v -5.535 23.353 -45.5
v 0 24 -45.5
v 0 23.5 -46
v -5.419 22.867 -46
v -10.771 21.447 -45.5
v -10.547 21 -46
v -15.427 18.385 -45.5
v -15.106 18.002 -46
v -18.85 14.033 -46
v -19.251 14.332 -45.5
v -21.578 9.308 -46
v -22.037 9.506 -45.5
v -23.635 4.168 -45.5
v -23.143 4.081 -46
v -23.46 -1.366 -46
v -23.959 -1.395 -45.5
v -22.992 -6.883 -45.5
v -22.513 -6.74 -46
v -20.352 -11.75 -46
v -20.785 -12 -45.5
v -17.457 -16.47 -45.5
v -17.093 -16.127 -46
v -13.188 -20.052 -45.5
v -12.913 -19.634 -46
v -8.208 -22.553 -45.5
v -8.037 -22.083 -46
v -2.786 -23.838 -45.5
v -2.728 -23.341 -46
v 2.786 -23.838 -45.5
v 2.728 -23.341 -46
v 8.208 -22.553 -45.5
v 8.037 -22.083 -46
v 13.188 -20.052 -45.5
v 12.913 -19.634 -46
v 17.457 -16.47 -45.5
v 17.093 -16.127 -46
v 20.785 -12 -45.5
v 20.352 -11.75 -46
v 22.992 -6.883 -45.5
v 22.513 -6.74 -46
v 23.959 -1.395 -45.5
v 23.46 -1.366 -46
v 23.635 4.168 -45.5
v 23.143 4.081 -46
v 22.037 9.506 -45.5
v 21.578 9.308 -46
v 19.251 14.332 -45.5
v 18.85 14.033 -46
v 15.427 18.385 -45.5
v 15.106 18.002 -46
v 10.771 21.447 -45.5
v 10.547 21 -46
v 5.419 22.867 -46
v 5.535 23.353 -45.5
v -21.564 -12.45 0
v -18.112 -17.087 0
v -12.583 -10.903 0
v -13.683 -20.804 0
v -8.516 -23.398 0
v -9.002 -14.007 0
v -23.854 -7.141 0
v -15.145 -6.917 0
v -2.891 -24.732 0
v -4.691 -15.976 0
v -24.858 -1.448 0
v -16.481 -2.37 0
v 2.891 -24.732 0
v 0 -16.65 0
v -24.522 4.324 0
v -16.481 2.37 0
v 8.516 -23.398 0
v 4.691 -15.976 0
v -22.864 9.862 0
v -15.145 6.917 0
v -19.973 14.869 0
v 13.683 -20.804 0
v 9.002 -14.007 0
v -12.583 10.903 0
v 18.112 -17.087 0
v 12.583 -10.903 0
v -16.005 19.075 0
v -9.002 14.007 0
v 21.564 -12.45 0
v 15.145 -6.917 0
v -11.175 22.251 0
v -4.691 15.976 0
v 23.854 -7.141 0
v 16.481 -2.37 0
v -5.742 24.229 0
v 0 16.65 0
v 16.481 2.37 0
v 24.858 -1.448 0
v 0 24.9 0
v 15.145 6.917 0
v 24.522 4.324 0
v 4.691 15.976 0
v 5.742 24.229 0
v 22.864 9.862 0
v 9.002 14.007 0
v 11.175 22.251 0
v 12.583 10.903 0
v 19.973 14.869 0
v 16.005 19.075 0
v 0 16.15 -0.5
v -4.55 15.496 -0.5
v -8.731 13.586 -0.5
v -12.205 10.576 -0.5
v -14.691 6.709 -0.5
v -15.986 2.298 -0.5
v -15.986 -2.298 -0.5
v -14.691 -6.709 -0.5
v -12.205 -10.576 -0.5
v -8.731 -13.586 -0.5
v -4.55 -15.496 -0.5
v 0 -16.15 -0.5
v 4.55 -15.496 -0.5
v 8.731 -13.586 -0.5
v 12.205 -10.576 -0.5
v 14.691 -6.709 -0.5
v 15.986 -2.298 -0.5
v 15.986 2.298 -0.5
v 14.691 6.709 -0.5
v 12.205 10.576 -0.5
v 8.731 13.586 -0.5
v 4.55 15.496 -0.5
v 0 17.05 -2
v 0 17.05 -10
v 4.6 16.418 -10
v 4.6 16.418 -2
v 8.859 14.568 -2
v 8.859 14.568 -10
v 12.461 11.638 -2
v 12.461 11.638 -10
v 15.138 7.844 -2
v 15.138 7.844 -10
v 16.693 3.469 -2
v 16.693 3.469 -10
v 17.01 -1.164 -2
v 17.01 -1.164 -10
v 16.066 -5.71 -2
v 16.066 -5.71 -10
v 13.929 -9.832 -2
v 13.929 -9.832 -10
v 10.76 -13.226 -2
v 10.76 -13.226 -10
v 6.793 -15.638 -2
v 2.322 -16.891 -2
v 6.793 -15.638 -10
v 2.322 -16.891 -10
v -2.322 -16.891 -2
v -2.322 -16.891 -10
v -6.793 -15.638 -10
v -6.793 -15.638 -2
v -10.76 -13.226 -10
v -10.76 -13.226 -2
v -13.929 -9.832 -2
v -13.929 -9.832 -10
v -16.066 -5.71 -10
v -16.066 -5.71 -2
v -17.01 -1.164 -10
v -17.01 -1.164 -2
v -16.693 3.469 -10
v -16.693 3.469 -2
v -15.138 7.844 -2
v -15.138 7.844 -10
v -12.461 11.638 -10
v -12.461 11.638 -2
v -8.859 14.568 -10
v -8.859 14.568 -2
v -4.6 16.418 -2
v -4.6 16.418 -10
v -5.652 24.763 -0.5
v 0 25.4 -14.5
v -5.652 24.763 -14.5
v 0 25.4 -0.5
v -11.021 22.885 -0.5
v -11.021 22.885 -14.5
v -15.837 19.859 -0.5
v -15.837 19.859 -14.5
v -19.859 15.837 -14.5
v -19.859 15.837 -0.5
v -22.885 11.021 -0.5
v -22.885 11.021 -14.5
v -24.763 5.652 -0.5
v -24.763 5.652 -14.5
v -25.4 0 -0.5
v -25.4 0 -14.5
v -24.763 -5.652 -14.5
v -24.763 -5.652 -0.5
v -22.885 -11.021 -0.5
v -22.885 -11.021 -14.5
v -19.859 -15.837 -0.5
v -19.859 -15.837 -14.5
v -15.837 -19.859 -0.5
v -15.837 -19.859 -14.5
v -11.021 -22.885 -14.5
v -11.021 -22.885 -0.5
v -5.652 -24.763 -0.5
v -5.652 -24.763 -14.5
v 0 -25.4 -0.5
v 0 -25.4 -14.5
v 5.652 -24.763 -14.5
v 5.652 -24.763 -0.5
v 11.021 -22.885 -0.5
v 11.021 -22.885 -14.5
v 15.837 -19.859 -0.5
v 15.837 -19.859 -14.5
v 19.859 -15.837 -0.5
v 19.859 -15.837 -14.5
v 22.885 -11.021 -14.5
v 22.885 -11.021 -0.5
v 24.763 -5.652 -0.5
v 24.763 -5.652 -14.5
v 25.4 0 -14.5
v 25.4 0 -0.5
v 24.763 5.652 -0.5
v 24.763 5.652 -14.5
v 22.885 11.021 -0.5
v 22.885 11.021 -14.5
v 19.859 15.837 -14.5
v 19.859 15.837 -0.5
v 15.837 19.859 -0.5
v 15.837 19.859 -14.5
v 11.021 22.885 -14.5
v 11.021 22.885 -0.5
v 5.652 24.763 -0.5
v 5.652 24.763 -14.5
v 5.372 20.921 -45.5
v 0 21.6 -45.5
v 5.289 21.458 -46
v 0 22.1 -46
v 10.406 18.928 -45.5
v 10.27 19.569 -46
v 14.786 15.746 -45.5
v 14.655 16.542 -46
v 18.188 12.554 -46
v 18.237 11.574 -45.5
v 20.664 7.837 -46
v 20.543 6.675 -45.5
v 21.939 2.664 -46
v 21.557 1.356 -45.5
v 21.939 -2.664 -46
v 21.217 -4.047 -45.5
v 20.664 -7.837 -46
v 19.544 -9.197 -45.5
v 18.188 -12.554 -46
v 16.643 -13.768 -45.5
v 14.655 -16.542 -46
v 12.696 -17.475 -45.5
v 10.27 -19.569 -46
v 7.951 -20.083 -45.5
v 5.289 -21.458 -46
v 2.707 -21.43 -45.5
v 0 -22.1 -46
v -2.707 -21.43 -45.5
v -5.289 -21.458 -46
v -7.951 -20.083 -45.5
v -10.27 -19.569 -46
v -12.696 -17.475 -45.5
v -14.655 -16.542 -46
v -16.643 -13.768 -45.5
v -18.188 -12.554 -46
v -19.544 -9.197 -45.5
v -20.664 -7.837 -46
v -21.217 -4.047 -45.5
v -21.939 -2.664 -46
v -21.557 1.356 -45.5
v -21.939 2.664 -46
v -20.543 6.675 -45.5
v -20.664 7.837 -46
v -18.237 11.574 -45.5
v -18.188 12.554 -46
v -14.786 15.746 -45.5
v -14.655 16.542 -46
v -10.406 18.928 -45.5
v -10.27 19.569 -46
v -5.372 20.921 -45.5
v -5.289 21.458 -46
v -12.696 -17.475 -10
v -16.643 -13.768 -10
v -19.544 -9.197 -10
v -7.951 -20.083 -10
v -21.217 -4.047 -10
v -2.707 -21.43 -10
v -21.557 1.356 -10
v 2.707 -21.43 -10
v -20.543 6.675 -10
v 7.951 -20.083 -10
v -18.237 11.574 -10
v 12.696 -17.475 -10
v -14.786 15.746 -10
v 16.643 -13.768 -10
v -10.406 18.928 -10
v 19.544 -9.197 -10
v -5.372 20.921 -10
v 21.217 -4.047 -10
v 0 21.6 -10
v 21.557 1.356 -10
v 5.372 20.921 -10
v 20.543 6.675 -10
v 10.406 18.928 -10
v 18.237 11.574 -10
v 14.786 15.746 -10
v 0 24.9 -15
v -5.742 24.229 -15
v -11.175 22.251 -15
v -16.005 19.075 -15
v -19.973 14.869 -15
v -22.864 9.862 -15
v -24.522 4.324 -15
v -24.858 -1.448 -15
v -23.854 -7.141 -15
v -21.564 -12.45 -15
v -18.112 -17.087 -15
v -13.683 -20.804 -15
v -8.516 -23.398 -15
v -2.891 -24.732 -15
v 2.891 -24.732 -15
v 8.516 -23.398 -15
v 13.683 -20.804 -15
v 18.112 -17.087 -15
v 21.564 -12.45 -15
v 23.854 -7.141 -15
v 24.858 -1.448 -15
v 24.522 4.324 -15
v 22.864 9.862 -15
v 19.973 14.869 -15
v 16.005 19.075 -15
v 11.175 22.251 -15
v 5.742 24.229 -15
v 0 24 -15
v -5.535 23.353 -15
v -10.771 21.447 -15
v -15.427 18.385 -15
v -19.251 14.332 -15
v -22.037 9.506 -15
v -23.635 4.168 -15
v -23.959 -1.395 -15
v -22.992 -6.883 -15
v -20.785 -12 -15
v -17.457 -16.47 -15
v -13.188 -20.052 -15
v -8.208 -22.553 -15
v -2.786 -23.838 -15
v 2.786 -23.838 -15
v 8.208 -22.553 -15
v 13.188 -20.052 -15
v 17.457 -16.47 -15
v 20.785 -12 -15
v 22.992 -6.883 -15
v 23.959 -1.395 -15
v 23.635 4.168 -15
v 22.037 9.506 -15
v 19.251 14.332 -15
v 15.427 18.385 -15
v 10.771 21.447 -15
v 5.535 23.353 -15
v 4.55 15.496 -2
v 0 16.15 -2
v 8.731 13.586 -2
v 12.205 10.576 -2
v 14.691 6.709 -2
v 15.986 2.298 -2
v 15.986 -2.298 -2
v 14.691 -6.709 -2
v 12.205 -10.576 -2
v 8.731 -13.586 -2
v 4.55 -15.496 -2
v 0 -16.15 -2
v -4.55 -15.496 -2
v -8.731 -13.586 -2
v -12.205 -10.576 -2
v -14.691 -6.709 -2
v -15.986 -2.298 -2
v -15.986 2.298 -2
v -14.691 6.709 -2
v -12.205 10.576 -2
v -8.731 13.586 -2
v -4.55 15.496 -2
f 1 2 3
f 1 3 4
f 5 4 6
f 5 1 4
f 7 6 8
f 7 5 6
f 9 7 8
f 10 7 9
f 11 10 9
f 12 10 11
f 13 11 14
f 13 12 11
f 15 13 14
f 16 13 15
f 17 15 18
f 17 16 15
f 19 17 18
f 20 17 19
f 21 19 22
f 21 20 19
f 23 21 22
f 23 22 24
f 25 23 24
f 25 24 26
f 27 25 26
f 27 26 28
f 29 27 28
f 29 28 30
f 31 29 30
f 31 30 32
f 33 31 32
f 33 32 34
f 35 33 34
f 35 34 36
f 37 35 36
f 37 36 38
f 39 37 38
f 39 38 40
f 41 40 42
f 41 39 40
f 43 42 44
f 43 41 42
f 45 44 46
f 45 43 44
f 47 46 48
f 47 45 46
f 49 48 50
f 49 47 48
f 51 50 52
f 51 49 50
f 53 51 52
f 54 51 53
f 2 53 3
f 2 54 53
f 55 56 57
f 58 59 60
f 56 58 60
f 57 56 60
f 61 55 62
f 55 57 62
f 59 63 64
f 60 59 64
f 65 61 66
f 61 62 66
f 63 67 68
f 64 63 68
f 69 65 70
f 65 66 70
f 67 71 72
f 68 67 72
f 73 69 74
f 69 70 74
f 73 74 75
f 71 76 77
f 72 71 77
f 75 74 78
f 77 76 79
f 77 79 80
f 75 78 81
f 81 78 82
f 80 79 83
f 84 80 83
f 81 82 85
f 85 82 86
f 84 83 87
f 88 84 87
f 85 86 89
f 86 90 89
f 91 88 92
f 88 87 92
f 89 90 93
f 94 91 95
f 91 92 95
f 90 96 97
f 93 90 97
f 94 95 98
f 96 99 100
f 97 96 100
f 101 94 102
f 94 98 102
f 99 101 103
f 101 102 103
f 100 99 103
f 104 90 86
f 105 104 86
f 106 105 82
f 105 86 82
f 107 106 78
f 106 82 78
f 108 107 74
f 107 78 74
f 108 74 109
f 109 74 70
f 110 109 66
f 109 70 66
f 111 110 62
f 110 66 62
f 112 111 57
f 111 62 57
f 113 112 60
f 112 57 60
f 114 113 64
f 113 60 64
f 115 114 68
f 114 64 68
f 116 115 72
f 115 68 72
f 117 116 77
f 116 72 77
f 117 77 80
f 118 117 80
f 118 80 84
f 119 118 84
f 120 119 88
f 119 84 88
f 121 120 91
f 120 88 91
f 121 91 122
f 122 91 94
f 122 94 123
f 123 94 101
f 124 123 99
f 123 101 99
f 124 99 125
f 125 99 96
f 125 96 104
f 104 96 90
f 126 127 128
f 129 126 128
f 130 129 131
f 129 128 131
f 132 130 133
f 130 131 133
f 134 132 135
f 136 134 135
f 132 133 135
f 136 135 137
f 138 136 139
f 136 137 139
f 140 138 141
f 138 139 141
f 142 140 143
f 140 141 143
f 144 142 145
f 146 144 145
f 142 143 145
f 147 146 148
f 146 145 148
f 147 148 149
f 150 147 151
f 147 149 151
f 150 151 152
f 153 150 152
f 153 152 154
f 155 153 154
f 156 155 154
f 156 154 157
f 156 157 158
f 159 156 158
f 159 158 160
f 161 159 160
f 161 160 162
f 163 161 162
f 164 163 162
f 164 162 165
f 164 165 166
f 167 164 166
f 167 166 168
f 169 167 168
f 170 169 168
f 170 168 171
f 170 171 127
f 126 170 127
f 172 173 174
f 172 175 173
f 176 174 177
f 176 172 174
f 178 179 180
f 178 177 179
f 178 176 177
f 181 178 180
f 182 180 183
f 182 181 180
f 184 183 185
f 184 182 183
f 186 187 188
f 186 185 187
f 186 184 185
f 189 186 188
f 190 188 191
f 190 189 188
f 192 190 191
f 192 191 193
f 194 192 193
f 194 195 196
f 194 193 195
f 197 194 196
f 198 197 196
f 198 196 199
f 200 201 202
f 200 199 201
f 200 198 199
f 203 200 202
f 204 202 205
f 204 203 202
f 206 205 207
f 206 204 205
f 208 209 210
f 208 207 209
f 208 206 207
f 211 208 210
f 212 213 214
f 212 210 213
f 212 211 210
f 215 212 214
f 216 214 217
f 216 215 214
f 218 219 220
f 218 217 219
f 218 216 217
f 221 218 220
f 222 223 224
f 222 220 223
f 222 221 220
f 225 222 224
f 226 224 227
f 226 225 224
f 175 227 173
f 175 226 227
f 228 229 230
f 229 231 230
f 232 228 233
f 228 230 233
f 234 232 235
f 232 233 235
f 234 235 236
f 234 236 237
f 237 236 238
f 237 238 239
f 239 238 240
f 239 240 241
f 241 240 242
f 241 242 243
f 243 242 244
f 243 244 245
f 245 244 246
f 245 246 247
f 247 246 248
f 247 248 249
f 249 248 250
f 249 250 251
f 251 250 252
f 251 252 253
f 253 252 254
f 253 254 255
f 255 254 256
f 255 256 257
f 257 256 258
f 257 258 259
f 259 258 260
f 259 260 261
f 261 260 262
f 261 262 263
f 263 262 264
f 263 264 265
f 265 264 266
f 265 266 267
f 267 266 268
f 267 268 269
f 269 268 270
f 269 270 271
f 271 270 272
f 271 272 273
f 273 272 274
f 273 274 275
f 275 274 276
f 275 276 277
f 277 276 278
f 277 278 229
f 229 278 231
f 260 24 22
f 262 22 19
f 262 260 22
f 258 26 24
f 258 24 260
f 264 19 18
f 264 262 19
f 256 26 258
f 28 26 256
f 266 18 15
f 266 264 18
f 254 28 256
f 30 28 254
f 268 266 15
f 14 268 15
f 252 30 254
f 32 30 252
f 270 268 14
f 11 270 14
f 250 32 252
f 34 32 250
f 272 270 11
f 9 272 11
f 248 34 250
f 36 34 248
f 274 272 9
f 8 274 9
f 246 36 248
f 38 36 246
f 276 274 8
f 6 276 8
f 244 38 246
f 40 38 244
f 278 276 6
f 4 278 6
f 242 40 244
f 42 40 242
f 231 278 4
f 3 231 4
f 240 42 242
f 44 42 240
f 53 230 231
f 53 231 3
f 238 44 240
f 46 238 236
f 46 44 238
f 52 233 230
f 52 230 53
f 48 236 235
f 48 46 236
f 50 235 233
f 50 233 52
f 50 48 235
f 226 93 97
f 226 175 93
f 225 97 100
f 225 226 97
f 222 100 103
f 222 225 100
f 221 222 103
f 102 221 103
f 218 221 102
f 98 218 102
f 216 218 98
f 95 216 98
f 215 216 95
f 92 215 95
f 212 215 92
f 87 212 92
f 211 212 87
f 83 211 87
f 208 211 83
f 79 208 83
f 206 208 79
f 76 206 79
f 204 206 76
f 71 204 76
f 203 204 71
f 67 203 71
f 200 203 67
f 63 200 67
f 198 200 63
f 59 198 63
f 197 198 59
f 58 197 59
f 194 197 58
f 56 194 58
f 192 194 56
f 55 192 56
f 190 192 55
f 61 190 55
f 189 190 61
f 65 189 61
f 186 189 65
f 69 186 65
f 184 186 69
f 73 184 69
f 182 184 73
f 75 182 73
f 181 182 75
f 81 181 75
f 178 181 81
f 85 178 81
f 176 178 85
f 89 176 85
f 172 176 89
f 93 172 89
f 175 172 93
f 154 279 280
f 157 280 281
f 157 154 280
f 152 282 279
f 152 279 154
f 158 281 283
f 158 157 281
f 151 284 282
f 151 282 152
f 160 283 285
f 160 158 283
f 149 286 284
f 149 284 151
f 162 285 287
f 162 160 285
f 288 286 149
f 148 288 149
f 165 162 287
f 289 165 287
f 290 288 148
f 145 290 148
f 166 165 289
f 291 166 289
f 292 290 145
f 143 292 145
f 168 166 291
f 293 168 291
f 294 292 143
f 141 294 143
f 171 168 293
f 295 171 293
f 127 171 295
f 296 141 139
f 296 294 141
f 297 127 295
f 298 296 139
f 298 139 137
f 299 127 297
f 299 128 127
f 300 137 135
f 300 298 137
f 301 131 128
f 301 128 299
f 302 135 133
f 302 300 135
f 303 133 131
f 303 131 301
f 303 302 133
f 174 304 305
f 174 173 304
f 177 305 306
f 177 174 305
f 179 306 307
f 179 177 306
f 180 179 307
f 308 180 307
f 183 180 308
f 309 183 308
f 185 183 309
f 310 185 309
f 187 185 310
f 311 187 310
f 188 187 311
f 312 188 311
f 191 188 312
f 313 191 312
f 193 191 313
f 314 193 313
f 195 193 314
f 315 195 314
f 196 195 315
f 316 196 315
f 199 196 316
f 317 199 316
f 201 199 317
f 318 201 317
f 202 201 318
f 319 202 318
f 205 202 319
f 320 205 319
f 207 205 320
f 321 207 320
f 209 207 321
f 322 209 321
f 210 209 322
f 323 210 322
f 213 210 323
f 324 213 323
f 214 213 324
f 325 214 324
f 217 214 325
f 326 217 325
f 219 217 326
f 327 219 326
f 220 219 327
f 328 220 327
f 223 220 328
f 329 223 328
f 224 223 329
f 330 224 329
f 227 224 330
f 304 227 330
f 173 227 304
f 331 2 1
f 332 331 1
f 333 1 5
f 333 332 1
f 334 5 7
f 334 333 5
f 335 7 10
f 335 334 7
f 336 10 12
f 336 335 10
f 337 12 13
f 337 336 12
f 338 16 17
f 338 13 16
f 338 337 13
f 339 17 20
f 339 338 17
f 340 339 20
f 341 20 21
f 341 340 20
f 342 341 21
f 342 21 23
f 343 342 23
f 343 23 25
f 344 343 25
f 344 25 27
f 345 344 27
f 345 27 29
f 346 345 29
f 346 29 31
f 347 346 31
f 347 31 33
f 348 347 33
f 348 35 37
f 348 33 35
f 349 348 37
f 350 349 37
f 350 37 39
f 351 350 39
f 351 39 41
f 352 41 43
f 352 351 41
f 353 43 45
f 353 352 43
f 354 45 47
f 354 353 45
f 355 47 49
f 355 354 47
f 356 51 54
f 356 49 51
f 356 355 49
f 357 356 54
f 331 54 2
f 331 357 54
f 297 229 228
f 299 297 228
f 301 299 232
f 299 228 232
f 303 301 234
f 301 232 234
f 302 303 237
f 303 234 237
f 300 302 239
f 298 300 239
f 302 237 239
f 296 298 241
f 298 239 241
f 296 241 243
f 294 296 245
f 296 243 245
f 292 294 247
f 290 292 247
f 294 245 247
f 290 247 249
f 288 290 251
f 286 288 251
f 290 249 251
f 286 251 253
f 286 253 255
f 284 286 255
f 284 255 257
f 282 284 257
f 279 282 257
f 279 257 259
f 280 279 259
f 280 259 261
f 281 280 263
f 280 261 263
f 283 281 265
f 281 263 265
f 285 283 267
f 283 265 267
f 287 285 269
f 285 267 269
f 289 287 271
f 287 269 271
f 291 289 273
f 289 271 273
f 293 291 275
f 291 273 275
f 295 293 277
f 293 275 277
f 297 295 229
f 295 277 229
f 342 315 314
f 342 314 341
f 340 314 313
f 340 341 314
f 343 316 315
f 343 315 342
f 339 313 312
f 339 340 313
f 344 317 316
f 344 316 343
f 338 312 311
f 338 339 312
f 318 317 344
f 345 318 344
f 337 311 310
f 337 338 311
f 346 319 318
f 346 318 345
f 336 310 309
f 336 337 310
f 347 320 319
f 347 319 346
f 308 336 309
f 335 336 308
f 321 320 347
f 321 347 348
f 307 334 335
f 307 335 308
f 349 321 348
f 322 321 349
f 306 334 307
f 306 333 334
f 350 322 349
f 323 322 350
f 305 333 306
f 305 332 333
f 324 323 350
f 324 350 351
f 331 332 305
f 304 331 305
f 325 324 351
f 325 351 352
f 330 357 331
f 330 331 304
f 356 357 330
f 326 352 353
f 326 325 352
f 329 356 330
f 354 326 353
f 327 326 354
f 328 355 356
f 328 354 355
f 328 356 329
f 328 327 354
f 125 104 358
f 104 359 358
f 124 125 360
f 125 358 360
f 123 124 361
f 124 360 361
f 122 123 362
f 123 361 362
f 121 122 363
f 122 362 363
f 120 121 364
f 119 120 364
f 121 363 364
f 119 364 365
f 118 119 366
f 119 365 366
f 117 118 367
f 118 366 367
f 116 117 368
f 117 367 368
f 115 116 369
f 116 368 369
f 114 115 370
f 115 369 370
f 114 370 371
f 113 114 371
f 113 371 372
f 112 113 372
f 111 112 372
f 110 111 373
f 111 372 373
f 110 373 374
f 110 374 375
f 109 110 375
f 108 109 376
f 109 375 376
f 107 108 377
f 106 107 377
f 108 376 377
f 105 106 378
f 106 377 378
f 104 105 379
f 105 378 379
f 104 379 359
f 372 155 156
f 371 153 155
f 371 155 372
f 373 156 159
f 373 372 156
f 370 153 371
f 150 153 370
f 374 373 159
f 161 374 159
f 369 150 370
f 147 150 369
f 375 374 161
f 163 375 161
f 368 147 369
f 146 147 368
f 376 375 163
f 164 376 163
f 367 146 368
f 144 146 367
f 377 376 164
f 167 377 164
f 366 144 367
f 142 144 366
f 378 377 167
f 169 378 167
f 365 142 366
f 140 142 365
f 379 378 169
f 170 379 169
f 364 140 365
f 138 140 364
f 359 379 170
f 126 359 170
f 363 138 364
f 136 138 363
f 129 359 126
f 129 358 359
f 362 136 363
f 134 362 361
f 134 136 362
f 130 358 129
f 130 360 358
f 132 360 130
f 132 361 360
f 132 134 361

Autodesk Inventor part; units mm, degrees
ref_plane "YZ Plane" through (0, 0, 0) normal (1, 0, 0) x (0, 1, 0)
ref_plane "XZ Plane" through (0, 0, 0) normal (0, 1, 0) x (-1, 0, 0)
ref_plane "XY Plane" through (0, 0, 0) normal (0, 0, 1) x (1, 0, 0)
sketch "Sketch2" plane through (0, 0, 0) normal (1, 0, 0) x (0, 1, 0)
  line L0 (17.05, -2) -> (17.05, -10)
  line L1 (17.05, -10) -> (21.6, -10)
  line L2 (21.6, -10) -> (21.6, -46)
  line L3 (21.6, -46) -> (24, -46)
  line L4 (24, -46) -> (24, -15)
  line L5 (24, -15) -> (25.4, -15)
  line L6 (25.4, -15) -> (25.4, 0)
  line L7 (25.4, 0) -> (17.05, 0)
  line L8 (0, 0) -> (0, -55.6888)
  line L9 (17.05, 0) -> (16.15, 0)
  line L10 (16.15, 0) -> (16.15, -2)
  line L11 (16.15, -2) -> (17.05, -2)
  line L12 (17.05, -2) -> (17.05, 0)
  point P0 (24.7, -15)
  dimension "d0" = 10
  dimension "d1" = 36
  dimension "d2" = 17.05
  dimension "d3" = 21.6
  dimension "d4" = 25.4
  dimension "d5" = 24
  dimension "d6" = 15
  dimension "d7" = 2
  dimension "d8" = 0.9
revolve "Revolution2" add sketch "Sketch2" angle 360 about axis through (0, 0, 0) along (0, 0, -1)
chamfer "Chamfer1" distance 0.5 angle 45 5 edges at (0, -25.4, 0) (0, -25.4, -15) (0, -16.15, 0) (0, -24, -46) (0, -21.6, -46)
properties part number "Nikon50mm-barebone-mount"
